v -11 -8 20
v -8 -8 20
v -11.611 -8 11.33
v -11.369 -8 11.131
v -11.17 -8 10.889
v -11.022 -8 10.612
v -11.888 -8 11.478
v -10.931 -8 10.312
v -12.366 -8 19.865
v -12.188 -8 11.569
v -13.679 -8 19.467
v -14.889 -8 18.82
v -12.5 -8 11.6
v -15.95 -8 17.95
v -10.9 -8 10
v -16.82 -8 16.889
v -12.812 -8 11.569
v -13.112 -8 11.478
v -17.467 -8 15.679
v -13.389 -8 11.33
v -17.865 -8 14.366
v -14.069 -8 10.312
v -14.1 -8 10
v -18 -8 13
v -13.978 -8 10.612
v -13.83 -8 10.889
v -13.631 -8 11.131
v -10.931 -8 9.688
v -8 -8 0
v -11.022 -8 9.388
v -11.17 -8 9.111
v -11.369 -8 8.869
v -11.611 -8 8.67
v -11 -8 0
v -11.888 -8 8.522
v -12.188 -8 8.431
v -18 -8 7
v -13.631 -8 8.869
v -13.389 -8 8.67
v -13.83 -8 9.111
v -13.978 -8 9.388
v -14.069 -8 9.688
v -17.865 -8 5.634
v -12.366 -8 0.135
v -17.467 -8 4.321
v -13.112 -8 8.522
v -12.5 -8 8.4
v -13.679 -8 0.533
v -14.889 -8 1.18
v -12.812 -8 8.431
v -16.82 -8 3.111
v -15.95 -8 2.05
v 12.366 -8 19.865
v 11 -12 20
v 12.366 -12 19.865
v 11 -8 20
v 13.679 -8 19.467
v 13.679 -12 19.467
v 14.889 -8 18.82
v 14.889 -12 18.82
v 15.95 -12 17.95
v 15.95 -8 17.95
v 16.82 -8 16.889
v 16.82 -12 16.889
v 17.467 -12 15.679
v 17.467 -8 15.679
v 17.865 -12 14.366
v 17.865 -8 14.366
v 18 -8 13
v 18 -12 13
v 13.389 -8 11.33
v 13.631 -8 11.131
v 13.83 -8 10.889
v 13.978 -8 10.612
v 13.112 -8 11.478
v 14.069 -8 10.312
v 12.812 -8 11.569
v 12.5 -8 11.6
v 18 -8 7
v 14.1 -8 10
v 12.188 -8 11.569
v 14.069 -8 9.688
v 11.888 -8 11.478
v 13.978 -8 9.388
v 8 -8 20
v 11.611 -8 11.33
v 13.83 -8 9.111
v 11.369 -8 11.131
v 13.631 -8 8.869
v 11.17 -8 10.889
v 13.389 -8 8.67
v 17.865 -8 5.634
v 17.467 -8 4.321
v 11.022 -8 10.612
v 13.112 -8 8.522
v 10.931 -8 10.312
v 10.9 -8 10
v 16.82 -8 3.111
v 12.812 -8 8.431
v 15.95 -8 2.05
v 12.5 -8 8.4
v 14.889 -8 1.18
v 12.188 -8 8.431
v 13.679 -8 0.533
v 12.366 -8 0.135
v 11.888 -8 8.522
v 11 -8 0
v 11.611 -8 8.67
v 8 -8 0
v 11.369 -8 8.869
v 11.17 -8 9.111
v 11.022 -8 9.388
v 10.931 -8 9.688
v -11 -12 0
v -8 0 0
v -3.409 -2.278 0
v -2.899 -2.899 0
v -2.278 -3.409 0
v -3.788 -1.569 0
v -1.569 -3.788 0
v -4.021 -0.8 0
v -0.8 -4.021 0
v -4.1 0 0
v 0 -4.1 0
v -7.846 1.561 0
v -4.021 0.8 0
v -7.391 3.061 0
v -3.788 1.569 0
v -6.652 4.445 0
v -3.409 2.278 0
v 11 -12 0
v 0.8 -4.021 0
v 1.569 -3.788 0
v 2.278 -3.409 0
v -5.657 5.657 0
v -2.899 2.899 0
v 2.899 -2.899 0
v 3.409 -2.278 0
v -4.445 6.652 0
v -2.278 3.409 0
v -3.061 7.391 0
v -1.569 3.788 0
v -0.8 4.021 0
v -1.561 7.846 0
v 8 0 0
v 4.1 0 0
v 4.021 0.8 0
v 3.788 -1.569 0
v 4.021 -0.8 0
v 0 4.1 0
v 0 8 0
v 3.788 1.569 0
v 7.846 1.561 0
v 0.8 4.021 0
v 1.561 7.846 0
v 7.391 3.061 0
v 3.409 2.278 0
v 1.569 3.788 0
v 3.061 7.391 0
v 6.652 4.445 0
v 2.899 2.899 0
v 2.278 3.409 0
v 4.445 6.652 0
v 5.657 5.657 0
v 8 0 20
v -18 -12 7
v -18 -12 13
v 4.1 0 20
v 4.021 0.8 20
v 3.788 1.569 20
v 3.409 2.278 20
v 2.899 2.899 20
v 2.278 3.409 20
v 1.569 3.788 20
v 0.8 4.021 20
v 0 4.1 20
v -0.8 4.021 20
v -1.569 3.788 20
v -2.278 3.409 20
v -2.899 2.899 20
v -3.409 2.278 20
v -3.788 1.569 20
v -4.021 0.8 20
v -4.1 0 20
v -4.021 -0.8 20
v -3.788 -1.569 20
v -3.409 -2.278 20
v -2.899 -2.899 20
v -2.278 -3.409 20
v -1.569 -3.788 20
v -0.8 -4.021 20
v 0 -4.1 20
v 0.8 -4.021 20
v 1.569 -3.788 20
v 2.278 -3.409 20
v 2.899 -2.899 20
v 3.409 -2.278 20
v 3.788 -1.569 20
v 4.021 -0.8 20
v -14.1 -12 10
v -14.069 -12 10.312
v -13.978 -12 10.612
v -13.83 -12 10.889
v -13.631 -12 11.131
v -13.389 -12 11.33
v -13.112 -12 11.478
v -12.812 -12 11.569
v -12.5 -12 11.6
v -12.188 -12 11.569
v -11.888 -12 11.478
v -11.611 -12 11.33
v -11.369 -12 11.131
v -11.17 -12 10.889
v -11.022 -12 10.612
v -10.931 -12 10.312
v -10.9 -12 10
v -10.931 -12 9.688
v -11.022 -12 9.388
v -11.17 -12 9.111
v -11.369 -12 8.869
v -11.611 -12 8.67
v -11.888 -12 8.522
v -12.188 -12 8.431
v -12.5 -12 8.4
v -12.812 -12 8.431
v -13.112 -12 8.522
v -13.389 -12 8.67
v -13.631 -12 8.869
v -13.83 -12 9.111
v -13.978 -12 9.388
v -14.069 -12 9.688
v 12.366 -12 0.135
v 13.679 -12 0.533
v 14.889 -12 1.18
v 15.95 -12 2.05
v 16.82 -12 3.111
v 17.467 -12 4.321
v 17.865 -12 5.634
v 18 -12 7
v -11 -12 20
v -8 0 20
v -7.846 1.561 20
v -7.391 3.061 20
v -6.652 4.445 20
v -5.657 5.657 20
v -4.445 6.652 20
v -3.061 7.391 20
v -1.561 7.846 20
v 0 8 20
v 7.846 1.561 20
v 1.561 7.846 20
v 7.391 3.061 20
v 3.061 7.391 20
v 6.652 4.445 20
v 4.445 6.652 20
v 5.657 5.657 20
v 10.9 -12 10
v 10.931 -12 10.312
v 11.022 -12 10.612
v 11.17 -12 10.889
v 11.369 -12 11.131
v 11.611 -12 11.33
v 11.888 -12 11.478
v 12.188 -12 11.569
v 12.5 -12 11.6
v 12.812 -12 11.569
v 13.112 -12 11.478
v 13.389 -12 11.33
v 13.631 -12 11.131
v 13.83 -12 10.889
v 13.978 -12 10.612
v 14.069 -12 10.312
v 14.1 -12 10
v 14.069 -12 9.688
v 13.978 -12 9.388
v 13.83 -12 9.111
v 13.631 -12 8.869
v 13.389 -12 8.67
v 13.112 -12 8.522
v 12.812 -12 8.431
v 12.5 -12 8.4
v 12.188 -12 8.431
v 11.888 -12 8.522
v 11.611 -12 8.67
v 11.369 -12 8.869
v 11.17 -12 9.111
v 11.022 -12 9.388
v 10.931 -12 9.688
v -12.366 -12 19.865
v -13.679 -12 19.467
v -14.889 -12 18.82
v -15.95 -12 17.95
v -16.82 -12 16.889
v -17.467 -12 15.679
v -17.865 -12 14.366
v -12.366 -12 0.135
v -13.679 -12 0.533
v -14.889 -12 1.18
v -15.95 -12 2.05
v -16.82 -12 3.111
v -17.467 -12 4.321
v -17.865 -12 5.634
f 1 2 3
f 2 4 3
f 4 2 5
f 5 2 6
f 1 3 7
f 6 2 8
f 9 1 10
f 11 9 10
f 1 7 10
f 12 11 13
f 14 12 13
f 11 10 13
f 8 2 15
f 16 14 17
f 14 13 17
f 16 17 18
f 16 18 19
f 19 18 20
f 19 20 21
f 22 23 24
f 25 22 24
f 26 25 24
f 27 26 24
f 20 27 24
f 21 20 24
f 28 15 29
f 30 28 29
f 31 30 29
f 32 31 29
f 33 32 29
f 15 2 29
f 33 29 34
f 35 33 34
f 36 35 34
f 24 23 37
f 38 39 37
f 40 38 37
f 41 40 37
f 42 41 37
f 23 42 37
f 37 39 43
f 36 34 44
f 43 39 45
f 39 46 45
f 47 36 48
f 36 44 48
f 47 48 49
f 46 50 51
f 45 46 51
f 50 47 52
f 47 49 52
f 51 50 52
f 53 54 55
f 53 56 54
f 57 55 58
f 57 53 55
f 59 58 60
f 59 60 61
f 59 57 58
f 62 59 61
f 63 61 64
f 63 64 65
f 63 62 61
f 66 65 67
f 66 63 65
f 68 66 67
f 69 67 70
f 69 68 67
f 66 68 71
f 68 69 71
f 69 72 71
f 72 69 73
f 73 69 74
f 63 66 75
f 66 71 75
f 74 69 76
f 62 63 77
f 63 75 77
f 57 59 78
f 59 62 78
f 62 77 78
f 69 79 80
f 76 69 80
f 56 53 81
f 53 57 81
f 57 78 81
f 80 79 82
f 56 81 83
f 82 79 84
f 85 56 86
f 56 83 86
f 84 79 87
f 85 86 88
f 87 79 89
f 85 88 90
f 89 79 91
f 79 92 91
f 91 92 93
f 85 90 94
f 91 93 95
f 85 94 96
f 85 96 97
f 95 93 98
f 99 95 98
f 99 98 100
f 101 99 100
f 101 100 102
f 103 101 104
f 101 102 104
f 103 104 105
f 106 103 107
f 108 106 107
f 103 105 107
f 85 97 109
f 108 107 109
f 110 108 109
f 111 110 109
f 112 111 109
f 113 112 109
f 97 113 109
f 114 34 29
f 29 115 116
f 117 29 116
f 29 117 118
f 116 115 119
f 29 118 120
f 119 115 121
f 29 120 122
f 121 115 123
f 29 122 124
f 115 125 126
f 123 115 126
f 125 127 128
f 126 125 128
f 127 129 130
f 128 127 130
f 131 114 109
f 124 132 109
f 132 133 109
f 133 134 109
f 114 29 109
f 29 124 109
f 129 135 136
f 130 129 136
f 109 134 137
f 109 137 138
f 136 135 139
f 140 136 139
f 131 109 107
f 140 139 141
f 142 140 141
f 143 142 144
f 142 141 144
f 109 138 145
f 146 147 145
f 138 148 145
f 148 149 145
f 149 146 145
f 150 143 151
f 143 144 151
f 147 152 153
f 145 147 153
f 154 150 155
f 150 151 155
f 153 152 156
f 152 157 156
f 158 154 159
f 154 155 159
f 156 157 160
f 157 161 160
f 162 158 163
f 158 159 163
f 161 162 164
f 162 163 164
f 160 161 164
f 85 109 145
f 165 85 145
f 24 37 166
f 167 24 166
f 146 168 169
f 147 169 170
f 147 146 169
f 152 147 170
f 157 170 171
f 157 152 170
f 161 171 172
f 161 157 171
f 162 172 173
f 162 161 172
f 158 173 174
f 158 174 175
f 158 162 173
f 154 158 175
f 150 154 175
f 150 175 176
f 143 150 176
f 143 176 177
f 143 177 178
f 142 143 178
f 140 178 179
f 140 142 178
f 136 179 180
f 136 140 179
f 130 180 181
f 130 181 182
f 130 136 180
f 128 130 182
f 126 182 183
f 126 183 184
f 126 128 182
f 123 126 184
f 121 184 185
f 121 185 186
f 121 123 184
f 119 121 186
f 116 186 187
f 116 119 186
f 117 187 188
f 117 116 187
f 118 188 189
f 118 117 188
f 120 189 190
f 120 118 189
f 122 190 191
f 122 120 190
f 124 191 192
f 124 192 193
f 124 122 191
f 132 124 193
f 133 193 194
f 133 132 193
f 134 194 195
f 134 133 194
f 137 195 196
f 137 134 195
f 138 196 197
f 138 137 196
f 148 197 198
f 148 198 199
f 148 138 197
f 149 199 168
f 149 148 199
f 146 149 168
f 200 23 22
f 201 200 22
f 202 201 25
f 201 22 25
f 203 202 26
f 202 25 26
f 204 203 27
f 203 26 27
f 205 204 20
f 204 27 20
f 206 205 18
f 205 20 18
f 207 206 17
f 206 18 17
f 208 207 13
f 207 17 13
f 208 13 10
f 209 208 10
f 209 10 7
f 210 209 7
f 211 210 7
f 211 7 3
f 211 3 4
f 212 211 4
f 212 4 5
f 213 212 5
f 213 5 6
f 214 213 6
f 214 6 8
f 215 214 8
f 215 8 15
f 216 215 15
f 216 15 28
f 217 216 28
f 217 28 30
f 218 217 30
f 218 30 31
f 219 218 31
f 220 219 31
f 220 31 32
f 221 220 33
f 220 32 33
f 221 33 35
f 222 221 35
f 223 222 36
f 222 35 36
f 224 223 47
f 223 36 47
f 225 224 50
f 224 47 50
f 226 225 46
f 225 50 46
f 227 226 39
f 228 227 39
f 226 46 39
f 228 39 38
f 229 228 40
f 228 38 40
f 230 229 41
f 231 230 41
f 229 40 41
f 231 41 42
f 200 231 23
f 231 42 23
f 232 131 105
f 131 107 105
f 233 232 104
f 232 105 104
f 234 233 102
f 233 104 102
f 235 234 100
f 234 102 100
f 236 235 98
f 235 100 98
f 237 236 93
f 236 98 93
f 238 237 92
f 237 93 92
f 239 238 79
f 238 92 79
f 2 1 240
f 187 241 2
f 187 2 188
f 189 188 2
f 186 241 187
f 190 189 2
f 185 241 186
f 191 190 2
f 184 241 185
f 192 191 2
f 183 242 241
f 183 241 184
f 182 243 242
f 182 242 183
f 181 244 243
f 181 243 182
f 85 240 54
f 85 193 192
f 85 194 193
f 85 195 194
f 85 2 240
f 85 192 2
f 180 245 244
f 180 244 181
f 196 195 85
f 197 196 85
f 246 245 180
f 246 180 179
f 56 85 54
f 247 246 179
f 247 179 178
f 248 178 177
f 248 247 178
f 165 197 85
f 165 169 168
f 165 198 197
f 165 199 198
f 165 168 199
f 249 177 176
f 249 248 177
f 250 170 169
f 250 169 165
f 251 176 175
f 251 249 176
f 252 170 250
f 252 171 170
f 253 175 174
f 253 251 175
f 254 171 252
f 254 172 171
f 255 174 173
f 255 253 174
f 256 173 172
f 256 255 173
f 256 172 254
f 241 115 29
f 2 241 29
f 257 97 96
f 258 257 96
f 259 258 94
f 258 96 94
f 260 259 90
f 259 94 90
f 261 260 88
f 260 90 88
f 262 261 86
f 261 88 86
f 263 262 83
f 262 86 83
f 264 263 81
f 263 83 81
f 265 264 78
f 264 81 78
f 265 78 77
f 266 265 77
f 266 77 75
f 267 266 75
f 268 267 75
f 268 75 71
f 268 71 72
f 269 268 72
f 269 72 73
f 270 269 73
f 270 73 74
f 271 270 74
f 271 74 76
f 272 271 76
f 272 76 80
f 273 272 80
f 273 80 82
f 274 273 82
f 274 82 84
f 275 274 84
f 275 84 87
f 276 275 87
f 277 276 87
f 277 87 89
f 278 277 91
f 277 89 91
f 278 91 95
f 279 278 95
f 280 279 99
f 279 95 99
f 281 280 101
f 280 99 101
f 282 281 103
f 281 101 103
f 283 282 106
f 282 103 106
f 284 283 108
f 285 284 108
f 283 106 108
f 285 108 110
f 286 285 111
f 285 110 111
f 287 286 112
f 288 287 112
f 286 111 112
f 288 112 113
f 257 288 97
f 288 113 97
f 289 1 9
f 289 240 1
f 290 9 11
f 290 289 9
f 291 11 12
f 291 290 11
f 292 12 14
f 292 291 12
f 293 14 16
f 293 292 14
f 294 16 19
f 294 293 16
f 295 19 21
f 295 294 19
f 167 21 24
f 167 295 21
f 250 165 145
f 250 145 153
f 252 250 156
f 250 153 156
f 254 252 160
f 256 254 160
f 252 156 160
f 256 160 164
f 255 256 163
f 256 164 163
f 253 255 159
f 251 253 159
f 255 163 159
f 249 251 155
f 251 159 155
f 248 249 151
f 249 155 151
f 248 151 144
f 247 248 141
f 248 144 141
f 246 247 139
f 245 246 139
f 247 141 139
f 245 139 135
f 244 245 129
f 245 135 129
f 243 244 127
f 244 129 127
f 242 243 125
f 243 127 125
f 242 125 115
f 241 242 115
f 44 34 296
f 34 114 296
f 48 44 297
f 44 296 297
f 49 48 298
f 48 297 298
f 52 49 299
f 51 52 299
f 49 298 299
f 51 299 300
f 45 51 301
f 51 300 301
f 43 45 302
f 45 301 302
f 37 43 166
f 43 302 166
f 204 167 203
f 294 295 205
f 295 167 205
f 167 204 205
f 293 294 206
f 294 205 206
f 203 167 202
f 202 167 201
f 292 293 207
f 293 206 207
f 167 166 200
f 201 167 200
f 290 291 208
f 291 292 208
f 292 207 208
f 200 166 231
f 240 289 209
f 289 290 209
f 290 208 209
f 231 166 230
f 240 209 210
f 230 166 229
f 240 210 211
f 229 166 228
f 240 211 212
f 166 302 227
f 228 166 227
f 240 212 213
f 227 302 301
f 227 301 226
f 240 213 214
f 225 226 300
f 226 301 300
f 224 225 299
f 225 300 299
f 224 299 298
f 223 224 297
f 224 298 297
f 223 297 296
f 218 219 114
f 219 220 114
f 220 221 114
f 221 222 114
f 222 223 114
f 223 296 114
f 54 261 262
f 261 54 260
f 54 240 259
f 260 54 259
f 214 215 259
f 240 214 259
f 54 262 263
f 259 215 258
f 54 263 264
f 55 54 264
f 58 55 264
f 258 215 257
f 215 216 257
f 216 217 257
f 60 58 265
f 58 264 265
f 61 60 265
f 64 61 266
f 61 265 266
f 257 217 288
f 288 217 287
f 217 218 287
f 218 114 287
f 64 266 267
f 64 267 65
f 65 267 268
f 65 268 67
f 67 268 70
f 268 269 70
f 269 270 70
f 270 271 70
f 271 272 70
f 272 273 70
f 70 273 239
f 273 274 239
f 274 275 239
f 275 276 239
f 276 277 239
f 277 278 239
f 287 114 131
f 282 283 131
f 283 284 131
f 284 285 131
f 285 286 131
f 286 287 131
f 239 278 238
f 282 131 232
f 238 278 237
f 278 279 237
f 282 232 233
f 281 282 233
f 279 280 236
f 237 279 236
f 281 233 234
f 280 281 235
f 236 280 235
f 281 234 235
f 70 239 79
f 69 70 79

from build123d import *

# Parameters (mm, degrees)
ESBO_O1_R                = 4.1
RESSALTO_EXTRUS_O1_DEPTH = 20
ESBO_O2_R                = 1.6
CORTE_EXTRUS_O1_DEPTH    = 20
FILETE1_R                = 7


with BuildPart() as part:
    # Esboço1 → Ressalto-extrusão1 (new body)
    with BuildSketch(Plane.XY):
        with BuildLine():
            Line((-8, 0), (-8, -8))
            Line((-8, -8), (-18, -8))
            Line((-18, -8), (-18, -12))
            Line((-18, -12), (18, -12))
            Line((18, -12), (18, -8))
            Line((18, -8), (8, -8))
            Line((8, -8), (8, 0))
            ThreePointArc((8, 0), (0, 8), (-8, 0))
        make_face()
        Circle(ESBO_O1_R, mode=Mode.SUBTRACT)
    extrude(amount=RESSALTO_EXTRUS_O1_DEPTH)

    # Esboço2 → Corte-extrusão1 (cut)
    with BuildSketch(Plane(origin=(0, -8, 0), x_dir=(1, 0, 0), z_dir=(0, 1, 0))):
        with Locations(Location((-12.5, -10, 0), (0, 0, 180))):
            Circle(ESBO_O2_R)
        with Locations(Location((12.5, -10, 0), (0, 0, 180))):
            Circle(ESBO_O2_R)
    extrude(amount=-CORTE_EXTRUS_O1_DEPTH, mode=Mode.SUBTRACT)

    # Filete1
    filete1_edges = [part.edges().sort_by_distance(p)[0] for p in [
        (-18, -10, 20),
        (18, -10, 20),
        (18, -10, 0),
        (-18, -10, 0),
    ]]
    fillet(filete1_edges, radius=FILETE1_R)


solid = part.part
